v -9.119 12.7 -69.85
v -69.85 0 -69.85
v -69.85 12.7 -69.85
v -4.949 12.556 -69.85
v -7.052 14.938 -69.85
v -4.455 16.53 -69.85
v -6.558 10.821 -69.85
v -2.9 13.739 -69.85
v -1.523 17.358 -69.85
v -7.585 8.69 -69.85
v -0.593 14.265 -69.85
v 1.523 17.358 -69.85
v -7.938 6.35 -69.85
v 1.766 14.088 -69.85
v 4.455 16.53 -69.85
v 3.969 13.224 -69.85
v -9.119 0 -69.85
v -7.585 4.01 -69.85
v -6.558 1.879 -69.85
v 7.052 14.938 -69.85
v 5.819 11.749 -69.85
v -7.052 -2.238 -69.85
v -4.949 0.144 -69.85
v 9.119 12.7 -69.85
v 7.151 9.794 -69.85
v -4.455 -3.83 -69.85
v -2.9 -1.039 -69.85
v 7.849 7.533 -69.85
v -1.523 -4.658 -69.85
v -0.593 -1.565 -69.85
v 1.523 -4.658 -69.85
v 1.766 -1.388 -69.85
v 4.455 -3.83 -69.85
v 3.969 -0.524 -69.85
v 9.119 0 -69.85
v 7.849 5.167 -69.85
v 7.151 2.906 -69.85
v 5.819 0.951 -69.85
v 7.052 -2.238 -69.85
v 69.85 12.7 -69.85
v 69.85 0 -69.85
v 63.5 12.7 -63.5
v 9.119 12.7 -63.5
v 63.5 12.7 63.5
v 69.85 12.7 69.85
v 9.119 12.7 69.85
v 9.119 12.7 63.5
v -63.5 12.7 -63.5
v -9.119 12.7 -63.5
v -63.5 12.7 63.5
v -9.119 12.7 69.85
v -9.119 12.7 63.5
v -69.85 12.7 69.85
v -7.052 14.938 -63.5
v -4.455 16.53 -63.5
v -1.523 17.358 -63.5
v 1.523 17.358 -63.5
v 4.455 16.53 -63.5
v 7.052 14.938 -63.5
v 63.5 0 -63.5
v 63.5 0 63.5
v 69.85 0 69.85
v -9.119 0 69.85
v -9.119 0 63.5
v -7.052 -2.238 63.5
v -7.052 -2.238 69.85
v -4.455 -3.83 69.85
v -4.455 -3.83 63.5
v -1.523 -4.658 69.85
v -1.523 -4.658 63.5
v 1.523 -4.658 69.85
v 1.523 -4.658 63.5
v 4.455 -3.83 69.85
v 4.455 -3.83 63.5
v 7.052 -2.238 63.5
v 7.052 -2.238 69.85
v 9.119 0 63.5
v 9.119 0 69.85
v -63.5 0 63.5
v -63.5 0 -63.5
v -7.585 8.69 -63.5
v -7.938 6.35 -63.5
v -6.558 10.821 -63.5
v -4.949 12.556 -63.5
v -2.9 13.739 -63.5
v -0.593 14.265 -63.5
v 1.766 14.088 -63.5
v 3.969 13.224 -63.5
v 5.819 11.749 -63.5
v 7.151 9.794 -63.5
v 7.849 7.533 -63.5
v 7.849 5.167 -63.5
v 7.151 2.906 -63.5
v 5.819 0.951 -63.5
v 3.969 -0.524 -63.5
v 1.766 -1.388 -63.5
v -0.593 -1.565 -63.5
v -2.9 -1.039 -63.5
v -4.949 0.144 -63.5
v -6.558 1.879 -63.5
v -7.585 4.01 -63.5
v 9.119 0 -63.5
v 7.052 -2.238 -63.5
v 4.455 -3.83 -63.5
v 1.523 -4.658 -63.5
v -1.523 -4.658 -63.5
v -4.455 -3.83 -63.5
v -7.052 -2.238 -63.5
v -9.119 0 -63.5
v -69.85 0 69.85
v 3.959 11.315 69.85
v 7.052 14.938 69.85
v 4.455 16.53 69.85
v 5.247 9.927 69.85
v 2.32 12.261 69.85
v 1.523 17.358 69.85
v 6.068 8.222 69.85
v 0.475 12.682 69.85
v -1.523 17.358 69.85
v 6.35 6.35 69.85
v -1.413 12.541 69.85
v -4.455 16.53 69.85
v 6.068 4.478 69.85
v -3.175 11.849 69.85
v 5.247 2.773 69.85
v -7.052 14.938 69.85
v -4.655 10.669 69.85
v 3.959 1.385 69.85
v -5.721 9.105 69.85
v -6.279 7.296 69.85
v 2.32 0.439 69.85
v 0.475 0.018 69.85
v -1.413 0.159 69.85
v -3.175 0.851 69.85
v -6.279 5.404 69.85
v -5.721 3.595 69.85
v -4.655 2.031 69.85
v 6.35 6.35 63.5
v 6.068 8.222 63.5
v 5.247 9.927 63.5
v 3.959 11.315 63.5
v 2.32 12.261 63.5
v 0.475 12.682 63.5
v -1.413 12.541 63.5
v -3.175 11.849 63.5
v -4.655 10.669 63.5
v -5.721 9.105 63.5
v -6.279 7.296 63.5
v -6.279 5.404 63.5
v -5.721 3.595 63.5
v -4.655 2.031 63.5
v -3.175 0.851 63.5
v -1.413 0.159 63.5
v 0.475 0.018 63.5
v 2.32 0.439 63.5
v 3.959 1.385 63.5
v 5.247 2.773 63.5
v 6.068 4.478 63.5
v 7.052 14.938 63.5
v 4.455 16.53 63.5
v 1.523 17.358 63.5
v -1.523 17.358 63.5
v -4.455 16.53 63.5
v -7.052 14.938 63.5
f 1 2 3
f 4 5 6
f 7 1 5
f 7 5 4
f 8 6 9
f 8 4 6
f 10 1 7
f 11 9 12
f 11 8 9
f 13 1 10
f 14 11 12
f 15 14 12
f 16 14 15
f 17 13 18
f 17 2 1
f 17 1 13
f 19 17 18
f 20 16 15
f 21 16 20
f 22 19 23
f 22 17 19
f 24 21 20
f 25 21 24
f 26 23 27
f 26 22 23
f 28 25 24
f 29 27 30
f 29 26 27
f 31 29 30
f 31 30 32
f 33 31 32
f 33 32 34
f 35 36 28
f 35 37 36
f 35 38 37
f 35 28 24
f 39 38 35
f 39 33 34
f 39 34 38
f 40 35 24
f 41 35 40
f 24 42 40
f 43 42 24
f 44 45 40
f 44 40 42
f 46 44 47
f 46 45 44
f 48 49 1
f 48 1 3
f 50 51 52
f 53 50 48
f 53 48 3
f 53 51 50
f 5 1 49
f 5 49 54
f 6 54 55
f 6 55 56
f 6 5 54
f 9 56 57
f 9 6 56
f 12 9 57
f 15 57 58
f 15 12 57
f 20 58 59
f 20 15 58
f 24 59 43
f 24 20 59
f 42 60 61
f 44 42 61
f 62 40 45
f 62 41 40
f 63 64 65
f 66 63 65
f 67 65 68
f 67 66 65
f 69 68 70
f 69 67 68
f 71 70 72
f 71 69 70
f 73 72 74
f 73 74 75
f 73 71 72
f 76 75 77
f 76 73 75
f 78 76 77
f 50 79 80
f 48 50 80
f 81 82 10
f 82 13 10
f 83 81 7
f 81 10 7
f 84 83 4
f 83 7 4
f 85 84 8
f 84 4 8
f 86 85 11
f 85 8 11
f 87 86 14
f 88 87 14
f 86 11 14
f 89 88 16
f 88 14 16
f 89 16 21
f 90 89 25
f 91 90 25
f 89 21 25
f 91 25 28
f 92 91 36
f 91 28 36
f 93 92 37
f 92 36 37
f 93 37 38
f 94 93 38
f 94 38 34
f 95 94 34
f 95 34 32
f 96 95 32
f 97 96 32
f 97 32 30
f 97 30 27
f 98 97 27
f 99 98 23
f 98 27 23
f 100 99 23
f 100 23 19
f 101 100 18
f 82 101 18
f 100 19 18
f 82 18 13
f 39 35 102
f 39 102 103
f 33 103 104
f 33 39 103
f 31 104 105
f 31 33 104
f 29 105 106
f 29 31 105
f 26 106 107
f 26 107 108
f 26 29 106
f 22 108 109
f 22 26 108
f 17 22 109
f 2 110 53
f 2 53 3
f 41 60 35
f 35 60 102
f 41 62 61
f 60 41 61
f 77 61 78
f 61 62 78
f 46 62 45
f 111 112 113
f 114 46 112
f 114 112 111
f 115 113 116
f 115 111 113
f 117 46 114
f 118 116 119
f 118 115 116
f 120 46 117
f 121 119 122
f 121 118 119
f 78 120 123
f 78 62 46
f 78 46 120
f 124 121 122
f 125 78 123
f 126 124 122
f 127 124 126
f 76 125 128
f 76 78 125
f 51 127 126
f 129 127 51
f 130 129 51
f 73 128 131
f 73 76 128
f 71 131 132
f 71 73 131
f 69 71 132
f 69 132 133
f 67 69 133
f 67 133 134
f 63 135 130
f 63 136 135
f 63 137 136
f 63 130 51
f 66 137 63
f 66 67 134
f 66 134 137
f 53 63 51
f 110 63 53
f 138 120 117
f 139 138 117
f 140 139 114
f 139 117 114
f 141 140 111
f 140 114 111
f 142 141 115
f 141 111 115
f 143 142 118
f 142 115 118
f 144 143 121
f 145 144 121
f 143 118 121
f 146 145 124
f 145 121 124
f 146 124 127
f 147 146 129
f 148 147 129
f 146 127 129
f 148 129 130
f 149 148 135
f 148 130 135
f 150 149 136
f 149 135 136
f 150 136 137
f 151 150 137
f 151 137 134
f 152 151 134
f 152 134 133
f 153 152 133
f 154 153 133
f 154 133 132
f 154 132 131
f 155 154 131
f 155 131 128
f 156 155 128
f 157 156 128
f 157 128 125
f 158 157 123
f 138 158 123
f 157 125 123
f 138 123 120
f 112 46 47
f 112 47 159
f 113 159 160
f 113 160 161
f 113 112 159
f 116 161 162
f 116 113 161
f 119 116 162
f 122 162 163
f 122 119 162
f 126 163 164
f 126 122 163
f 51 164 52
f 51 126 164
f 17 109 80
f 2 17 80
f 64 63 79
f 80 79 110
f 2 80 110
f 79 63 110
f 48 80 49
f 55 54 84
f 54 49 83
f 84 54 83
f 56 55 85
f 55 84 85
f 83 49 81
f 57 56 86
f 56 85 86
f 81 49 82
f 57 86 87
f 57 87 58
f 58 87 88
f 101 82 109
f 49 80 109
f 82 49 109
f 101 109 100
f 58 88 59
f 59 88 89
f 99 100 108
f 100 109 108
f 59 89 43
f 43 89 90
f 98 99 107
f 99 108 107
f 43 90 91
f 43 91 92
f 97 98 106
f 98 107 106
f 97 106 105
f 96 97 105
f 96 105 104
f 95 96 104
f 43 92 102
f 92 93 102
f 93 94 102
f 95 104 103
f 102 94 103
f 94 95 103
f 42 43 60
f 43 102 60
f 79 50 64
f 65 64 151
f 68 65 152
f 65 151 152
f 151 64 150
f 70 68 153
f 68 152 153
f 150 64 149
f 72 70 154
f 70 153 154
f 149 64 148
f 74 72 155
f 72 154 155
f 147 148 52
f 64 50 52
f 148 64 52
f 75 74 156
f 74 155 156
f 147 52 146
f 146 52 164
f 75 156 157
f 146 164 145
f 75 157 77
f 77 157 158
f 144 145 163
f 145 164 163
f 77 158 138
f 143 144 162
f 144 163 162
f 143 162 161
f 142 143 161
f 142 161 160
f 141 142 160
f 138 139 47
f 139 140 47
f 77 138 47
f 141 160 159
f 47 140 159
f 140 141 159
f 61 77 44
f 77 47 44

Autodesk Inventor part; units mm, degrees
ref_plane "YZ Plane" through (0, 0, 0) normal (1, 0, 0) x (0, 1, 0)
ref_plane "XZ Plane" through (0, 0, 0) normal (0, 1, 0) x (-1, 0, 0)
ref_plane "XY Plane" through (0, 0, 0) normal (0, 0, 1) x (1, 0, 0)
sketch "Sketch1" plane through (0, 0, 0) normal (0, 1, 0) x (-1, 0, 0)
  line L0 (-63.5, 63.5) -> (63.5, 63.5)
  line L1 (63.5, 63.5) -> (63.5, -63.5)
  line L2 (63.5, -63.5) -> (-63.5, -63.5)
  line L3 (-63.5, -63.5) -> (-63.5, 63.5)
  line L4 (-63.5, 63.5) -> (63.5, -63.5) construction
  line L5 (63.5, 63.5) -> (-63.5, -63.5) construction
  line L6 (-69.85, 69.85) -> (69.85, 69.85)
  line L7 (69.85, 69.85) -> (69.85, -69.85)
  line L8 (69.85, -69.85) -> (-69.85, -69.85)
  line L9 (-69.85, -69.85) -> (-69.85, 69.85)
  line L10 (-69.85, 69.85) -> (69.85, -69.85) construction
  line L11 (69.85, 69.85) -> (-69.85, -69.85) construction
  point P0 (0, 0)
  dimension "d0" = 127
  dimension "d1" = 127
  dimension "d2" = 139.7
  dimension "d3" = 139.7
extrude "Extrusion1" add sketch "Sketch1" along normal blind 12.7
sketch "Sketch2" plane through (69.85, 0, -69.85) normal (0, 0, -1) x (-1, 0, 0)
  circle A0 centre (69.85, 6.35) radius 11.1125
  line L0 (0, 0) -> (0, 12.7) construction
  line L1 (0, 6.35) -> (69.85, 6.35) construction
  line L2 (69.85, 6.35) -> (139.7, 6.35) construction
  line L3 (139.7, 0) -> (139.7, 12.7) construction
  point P0 (69.85, 0)
  dimension "d6" = 22.225
extrude "Extrusion2" add sketch "Sketch2" against normal up to surface (6.35 mm away)
sketch "Sketch3" plane through (69.85, 0, -69.85) normal (0, 0, -1) x (-1, 0, 0)
  circle A0 centre (69.85, 6.35) radius 7.9375
  line L0 (0, 0) -> (0, 12.7) construction
  line L1 (0, 6.35) -> (69.85, 6.35) construction
  line L2 (69.85, 6.35) -> (139.7, 6.35) construction
  line L3 (139.7, 0) -> (139.7, 12.7) construction
  point P0 (69.85, 0)
  dimension "d9" = 15.875
extrude "Extrusion3" cut sketch "Sketch3" against normal up to next
sketch "Sketch4" plane through (-69.85, 0, 69.85) normal (0, 0, 1) x (1, 0, 0)
  circle A0 centre (69.85, 6.35) radius 11.1125
  line L0 (0, 0) -> (0, 12.7) construction
  line L1 (0, 6.35) -> (69.85, 6.35) construction
  line L2 (69.85, 6.35) -> (139.7, 6.35) construction
  line L3 (139.7, 0) -> (139.7, 12.7) construction
  point P0 (69.85, 0)
  dimension "d12" = 22.225
extrude "Extrusion4" add sketch "Sketch4" against normal up to surface (6.35 mm away)
sketch "Sketch5" plane through (-69.85, 0, 69.85) normal (0, 0, 1) x (1, 0, 0)
  circle A0 centre (69.85, 6.35) radius 6.35
  line L0 (0, 0) -> (0, 12.7) construction
  line L1 (0, 6.35) -> (69.85, 6.35) construction
  line L2 (69.85, 6.35) -> (139.7, 6.35) construction
  line L3 (139.7, 0) -> (139.7, 12.7) construction
  point P0 (69.85, 0)
  dimension "d15" = 12.7
extrude "Extrusion5" cut sketch "Sketch5" against normal up to next
properties part number "joystick_mount"
